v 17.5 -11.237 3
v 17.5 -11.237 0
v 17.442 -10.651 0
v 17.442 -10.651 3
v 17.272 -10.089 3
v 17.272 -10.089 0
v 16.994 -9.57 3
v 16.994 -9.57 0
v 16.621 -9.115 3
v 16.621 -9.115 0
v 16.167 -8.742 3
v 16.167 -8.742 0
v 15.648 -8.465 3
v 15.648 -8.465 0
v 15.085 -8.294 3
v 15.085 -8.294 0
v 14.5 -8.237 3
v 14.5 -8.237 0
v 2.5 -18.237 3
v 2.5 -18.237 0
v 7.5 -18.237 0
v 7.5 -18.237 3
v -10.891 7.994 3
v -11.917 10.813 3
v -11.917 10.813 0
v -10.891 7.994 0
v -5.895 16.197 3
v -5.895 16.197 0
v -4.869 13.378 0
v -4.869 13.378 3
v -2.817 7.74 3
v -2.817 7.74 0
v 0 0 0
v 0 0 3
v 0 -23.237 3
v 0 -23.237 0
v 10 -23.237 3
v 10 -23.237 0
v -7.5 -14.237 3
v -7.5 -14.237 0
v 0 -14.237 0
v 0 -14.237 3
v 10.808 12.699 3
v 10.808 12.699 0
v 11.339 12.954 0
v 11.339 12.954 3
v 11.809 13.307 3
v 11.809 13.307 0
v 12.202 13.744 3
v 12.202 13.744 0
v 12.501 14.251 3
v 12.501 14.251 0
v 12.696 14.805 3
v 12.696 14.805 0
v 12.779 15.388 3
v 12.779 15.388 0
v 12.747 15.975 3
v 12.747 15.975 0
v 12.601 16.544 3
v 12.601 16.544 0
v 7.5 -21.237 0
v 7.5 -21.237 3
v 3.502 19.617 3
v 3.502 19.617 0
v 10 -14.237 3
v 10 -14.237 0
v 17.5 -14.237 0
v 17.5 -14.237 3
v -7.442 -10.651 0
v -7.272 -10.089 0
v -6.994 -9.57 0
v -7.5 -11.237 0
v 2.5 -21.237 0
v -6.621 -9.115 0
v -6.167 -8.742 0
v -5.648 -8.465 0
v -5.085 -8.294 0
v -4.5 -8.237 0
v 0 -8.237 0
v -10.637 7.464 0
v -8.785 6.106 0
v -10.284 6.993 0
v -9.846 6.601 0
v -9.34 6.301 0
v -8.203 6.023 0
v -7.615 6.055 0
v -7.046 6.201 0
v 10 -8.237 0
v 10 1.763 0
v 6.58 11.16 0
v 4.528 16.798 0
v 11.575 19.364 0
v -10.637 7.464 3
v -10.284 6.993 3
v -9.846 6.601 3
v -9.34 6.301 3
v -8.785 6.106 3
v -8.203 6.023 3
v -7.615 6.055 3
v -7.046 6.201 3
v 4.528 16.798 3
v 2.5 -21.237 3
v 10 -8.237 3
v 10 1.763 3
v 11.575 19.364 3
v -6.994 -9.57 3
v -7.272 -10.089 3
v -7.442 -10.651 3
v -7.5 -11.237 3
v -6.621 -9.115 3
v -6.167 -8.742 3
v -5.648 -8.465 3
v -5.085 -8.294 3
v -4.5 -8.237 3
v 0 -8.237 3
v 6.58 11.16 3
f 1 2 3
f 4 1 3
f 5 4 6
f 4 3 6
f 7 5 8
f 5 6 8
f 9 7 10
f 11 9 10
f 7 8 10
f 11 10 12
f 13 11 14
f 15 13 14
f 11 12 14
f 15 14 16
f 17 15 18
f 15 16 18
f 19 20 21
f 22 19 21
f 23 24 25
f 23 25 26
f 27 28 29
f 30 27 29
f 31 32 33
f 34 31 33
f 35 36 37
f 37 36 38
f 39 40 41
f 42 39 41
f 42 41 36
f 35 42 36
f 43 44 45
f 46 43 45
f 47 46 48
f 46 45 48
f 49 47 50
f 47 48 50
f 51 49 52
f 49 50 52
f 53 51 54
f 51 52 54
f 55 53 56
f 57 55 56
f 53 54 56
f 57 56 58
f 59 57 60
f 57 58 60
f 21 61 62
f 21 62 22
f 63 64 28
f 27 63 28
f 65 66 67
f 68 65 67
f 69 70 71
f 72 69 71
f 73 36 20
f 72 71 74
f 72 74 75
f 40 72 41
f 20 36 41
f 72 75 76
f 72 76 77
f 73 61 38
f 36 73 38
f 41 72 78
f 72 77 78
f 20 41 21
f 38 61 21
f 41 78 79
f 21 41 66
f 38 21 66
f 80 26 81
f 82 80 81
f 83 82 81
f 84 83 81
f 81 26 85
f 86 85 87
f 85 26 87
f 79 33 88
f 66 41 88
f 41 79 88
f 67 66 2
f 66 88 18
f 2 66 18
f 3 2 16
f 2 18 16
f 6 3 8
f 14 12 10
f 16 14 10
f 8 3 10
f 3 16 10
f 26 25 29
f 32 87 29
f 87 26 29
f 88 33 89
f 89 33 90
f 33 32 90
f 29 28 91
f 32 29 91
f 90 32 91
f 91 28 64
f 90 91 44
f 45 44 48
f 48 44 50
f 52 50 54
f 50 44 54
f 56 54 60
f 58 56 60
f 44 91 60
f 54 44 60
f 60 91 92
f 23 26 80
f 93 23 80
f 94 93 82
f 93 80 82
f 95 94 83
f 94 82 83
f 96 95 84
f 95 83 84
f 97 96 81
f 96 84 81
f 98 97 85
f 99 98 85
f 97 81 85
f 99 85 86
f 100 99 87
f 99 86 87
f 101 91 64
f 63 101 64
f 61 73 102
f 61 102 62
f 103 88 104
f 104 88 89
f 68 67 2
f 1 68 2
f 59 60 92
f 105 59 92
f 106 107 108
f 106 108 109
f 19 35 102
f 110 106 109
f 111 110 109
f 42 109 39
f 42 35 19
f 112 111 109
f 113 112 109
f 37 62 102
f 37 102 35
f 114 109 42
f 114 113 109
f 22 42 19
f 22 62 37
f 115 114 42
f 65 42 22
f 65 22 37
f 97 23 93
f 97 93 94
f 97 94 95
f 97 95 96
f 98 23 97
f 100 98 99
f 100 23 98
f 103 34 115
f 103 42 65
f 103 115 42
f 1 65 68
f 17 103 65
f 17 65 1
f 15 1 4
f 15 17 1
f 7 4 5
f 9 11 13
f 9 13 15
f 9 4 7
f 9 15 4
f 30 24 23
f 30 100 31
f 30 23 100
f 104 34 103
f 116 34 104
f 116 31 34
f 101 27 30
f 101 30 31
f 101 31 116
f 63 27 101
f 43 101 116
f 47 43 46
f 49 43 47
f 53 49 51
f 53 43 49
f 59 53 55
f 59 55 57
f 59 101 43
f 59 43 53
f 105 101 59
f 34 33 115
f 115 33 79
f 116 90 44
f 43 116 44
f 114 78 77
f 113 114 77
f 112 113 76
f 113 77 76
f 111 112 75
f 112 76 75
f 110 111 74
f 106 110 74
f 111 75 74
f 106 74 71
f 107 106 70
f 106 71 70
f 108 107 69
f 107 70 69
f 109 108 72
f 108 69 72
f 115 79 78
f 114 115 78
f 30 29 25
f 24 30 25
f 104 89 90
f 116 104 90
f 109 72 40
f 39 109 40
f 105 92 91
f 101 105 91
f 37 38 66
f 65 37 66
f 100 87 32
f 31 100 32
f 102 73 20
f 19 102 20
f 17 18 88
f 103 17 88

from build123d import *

# Parameters (mm, degrees)
SKETCH1_W           = 5
SKETCH1_H           = 3
BOSS_EXTRUDE1_DEPTH = 3


with BuildPart() as part:
    # Sketch1 → Boss-Extrude1 (new body)
    with BuildSketch(Plane.XY):
        with BuildLine():
            Line((0, -14.236730193), (0, -23.236730193))
            Line((0, -23.236730193), (10, -23.236730193))
            Line((10, -23.236730193), (10, -14.236730193))
            Line((10, -14.236730193), (17.5, -14.236730193))
            Line((17.5, -14.236730193), (17.5, -11.236730193))
            ThreePointArc((17.5, -11.236730193), (16.621320344, -9.115409849), (14.5, -8.236730193))
            Line((14.5, -8.236730193), (10, -8.236730193))
            Line((10, -8.236730193), (10, 1.763269807))
            Line((10, 1.763269807), (6.579798567, 11.160196015))
            Line((6.579798567, 11.160196015), (10.80841536, 12.69928666))
            ThreePointArc((10.80841536, 12.69928666), (12.501278291, 14.250509737), (12.601432793, 16.544424952))
            Line((12.601432793, 16.544424952), (11.575372363, 19.363502815))
            Line((11.575372363, 19.363502815), (4.527677707, 16.79835174))
            Line((4.527677707, 16.79835174), (3.501617277, 19.617429602))
            Line((3.501617277, 19.617429602), (-5.895308931, 16.197228169))
            Line((-5.895308931, 16.197228169), (-4.869248501, 13.378150306))
            Line((-4.869248501, 13.378150306), (-11.916943157, 10.812999231))
            Line((-11.916943157, 10.812999231), (-10.890882727, 7.993921369))
            ThreePointArc((-10.890882727, 7.993921369), (-9.33965965, 6.301058438), (-7.045744435, 6.200903937))
            Line((-7.045744435, 6.200903937), (-2.817127641, 7.739994582))
            Line((-2.817127641, 7.739994582), (0, 0))
            Line((0, 0), (0, -8.236730193))
            Line((0, -8.236730193), (-4.5, -8.236730193))
            ThreePointArc((-4.5, -8.236730193), (-6.621320344, -9.115409849), (-7.5, -11.236730193))
            Line((-7.5, -11.236730193), (-7.5, -14.236730193))
            Line((-7.5, -14.236730193), (0, -14.236730193))
        make_face()
        with Locations((5, -19.736730193)):
            Rectangle(SKETCH1_W, SKETCH1_H, mode=Mode.SUBTRACT)
    extrude(amount=BOSS_EXTRUDE1_DEPTH)


solid = part.part
